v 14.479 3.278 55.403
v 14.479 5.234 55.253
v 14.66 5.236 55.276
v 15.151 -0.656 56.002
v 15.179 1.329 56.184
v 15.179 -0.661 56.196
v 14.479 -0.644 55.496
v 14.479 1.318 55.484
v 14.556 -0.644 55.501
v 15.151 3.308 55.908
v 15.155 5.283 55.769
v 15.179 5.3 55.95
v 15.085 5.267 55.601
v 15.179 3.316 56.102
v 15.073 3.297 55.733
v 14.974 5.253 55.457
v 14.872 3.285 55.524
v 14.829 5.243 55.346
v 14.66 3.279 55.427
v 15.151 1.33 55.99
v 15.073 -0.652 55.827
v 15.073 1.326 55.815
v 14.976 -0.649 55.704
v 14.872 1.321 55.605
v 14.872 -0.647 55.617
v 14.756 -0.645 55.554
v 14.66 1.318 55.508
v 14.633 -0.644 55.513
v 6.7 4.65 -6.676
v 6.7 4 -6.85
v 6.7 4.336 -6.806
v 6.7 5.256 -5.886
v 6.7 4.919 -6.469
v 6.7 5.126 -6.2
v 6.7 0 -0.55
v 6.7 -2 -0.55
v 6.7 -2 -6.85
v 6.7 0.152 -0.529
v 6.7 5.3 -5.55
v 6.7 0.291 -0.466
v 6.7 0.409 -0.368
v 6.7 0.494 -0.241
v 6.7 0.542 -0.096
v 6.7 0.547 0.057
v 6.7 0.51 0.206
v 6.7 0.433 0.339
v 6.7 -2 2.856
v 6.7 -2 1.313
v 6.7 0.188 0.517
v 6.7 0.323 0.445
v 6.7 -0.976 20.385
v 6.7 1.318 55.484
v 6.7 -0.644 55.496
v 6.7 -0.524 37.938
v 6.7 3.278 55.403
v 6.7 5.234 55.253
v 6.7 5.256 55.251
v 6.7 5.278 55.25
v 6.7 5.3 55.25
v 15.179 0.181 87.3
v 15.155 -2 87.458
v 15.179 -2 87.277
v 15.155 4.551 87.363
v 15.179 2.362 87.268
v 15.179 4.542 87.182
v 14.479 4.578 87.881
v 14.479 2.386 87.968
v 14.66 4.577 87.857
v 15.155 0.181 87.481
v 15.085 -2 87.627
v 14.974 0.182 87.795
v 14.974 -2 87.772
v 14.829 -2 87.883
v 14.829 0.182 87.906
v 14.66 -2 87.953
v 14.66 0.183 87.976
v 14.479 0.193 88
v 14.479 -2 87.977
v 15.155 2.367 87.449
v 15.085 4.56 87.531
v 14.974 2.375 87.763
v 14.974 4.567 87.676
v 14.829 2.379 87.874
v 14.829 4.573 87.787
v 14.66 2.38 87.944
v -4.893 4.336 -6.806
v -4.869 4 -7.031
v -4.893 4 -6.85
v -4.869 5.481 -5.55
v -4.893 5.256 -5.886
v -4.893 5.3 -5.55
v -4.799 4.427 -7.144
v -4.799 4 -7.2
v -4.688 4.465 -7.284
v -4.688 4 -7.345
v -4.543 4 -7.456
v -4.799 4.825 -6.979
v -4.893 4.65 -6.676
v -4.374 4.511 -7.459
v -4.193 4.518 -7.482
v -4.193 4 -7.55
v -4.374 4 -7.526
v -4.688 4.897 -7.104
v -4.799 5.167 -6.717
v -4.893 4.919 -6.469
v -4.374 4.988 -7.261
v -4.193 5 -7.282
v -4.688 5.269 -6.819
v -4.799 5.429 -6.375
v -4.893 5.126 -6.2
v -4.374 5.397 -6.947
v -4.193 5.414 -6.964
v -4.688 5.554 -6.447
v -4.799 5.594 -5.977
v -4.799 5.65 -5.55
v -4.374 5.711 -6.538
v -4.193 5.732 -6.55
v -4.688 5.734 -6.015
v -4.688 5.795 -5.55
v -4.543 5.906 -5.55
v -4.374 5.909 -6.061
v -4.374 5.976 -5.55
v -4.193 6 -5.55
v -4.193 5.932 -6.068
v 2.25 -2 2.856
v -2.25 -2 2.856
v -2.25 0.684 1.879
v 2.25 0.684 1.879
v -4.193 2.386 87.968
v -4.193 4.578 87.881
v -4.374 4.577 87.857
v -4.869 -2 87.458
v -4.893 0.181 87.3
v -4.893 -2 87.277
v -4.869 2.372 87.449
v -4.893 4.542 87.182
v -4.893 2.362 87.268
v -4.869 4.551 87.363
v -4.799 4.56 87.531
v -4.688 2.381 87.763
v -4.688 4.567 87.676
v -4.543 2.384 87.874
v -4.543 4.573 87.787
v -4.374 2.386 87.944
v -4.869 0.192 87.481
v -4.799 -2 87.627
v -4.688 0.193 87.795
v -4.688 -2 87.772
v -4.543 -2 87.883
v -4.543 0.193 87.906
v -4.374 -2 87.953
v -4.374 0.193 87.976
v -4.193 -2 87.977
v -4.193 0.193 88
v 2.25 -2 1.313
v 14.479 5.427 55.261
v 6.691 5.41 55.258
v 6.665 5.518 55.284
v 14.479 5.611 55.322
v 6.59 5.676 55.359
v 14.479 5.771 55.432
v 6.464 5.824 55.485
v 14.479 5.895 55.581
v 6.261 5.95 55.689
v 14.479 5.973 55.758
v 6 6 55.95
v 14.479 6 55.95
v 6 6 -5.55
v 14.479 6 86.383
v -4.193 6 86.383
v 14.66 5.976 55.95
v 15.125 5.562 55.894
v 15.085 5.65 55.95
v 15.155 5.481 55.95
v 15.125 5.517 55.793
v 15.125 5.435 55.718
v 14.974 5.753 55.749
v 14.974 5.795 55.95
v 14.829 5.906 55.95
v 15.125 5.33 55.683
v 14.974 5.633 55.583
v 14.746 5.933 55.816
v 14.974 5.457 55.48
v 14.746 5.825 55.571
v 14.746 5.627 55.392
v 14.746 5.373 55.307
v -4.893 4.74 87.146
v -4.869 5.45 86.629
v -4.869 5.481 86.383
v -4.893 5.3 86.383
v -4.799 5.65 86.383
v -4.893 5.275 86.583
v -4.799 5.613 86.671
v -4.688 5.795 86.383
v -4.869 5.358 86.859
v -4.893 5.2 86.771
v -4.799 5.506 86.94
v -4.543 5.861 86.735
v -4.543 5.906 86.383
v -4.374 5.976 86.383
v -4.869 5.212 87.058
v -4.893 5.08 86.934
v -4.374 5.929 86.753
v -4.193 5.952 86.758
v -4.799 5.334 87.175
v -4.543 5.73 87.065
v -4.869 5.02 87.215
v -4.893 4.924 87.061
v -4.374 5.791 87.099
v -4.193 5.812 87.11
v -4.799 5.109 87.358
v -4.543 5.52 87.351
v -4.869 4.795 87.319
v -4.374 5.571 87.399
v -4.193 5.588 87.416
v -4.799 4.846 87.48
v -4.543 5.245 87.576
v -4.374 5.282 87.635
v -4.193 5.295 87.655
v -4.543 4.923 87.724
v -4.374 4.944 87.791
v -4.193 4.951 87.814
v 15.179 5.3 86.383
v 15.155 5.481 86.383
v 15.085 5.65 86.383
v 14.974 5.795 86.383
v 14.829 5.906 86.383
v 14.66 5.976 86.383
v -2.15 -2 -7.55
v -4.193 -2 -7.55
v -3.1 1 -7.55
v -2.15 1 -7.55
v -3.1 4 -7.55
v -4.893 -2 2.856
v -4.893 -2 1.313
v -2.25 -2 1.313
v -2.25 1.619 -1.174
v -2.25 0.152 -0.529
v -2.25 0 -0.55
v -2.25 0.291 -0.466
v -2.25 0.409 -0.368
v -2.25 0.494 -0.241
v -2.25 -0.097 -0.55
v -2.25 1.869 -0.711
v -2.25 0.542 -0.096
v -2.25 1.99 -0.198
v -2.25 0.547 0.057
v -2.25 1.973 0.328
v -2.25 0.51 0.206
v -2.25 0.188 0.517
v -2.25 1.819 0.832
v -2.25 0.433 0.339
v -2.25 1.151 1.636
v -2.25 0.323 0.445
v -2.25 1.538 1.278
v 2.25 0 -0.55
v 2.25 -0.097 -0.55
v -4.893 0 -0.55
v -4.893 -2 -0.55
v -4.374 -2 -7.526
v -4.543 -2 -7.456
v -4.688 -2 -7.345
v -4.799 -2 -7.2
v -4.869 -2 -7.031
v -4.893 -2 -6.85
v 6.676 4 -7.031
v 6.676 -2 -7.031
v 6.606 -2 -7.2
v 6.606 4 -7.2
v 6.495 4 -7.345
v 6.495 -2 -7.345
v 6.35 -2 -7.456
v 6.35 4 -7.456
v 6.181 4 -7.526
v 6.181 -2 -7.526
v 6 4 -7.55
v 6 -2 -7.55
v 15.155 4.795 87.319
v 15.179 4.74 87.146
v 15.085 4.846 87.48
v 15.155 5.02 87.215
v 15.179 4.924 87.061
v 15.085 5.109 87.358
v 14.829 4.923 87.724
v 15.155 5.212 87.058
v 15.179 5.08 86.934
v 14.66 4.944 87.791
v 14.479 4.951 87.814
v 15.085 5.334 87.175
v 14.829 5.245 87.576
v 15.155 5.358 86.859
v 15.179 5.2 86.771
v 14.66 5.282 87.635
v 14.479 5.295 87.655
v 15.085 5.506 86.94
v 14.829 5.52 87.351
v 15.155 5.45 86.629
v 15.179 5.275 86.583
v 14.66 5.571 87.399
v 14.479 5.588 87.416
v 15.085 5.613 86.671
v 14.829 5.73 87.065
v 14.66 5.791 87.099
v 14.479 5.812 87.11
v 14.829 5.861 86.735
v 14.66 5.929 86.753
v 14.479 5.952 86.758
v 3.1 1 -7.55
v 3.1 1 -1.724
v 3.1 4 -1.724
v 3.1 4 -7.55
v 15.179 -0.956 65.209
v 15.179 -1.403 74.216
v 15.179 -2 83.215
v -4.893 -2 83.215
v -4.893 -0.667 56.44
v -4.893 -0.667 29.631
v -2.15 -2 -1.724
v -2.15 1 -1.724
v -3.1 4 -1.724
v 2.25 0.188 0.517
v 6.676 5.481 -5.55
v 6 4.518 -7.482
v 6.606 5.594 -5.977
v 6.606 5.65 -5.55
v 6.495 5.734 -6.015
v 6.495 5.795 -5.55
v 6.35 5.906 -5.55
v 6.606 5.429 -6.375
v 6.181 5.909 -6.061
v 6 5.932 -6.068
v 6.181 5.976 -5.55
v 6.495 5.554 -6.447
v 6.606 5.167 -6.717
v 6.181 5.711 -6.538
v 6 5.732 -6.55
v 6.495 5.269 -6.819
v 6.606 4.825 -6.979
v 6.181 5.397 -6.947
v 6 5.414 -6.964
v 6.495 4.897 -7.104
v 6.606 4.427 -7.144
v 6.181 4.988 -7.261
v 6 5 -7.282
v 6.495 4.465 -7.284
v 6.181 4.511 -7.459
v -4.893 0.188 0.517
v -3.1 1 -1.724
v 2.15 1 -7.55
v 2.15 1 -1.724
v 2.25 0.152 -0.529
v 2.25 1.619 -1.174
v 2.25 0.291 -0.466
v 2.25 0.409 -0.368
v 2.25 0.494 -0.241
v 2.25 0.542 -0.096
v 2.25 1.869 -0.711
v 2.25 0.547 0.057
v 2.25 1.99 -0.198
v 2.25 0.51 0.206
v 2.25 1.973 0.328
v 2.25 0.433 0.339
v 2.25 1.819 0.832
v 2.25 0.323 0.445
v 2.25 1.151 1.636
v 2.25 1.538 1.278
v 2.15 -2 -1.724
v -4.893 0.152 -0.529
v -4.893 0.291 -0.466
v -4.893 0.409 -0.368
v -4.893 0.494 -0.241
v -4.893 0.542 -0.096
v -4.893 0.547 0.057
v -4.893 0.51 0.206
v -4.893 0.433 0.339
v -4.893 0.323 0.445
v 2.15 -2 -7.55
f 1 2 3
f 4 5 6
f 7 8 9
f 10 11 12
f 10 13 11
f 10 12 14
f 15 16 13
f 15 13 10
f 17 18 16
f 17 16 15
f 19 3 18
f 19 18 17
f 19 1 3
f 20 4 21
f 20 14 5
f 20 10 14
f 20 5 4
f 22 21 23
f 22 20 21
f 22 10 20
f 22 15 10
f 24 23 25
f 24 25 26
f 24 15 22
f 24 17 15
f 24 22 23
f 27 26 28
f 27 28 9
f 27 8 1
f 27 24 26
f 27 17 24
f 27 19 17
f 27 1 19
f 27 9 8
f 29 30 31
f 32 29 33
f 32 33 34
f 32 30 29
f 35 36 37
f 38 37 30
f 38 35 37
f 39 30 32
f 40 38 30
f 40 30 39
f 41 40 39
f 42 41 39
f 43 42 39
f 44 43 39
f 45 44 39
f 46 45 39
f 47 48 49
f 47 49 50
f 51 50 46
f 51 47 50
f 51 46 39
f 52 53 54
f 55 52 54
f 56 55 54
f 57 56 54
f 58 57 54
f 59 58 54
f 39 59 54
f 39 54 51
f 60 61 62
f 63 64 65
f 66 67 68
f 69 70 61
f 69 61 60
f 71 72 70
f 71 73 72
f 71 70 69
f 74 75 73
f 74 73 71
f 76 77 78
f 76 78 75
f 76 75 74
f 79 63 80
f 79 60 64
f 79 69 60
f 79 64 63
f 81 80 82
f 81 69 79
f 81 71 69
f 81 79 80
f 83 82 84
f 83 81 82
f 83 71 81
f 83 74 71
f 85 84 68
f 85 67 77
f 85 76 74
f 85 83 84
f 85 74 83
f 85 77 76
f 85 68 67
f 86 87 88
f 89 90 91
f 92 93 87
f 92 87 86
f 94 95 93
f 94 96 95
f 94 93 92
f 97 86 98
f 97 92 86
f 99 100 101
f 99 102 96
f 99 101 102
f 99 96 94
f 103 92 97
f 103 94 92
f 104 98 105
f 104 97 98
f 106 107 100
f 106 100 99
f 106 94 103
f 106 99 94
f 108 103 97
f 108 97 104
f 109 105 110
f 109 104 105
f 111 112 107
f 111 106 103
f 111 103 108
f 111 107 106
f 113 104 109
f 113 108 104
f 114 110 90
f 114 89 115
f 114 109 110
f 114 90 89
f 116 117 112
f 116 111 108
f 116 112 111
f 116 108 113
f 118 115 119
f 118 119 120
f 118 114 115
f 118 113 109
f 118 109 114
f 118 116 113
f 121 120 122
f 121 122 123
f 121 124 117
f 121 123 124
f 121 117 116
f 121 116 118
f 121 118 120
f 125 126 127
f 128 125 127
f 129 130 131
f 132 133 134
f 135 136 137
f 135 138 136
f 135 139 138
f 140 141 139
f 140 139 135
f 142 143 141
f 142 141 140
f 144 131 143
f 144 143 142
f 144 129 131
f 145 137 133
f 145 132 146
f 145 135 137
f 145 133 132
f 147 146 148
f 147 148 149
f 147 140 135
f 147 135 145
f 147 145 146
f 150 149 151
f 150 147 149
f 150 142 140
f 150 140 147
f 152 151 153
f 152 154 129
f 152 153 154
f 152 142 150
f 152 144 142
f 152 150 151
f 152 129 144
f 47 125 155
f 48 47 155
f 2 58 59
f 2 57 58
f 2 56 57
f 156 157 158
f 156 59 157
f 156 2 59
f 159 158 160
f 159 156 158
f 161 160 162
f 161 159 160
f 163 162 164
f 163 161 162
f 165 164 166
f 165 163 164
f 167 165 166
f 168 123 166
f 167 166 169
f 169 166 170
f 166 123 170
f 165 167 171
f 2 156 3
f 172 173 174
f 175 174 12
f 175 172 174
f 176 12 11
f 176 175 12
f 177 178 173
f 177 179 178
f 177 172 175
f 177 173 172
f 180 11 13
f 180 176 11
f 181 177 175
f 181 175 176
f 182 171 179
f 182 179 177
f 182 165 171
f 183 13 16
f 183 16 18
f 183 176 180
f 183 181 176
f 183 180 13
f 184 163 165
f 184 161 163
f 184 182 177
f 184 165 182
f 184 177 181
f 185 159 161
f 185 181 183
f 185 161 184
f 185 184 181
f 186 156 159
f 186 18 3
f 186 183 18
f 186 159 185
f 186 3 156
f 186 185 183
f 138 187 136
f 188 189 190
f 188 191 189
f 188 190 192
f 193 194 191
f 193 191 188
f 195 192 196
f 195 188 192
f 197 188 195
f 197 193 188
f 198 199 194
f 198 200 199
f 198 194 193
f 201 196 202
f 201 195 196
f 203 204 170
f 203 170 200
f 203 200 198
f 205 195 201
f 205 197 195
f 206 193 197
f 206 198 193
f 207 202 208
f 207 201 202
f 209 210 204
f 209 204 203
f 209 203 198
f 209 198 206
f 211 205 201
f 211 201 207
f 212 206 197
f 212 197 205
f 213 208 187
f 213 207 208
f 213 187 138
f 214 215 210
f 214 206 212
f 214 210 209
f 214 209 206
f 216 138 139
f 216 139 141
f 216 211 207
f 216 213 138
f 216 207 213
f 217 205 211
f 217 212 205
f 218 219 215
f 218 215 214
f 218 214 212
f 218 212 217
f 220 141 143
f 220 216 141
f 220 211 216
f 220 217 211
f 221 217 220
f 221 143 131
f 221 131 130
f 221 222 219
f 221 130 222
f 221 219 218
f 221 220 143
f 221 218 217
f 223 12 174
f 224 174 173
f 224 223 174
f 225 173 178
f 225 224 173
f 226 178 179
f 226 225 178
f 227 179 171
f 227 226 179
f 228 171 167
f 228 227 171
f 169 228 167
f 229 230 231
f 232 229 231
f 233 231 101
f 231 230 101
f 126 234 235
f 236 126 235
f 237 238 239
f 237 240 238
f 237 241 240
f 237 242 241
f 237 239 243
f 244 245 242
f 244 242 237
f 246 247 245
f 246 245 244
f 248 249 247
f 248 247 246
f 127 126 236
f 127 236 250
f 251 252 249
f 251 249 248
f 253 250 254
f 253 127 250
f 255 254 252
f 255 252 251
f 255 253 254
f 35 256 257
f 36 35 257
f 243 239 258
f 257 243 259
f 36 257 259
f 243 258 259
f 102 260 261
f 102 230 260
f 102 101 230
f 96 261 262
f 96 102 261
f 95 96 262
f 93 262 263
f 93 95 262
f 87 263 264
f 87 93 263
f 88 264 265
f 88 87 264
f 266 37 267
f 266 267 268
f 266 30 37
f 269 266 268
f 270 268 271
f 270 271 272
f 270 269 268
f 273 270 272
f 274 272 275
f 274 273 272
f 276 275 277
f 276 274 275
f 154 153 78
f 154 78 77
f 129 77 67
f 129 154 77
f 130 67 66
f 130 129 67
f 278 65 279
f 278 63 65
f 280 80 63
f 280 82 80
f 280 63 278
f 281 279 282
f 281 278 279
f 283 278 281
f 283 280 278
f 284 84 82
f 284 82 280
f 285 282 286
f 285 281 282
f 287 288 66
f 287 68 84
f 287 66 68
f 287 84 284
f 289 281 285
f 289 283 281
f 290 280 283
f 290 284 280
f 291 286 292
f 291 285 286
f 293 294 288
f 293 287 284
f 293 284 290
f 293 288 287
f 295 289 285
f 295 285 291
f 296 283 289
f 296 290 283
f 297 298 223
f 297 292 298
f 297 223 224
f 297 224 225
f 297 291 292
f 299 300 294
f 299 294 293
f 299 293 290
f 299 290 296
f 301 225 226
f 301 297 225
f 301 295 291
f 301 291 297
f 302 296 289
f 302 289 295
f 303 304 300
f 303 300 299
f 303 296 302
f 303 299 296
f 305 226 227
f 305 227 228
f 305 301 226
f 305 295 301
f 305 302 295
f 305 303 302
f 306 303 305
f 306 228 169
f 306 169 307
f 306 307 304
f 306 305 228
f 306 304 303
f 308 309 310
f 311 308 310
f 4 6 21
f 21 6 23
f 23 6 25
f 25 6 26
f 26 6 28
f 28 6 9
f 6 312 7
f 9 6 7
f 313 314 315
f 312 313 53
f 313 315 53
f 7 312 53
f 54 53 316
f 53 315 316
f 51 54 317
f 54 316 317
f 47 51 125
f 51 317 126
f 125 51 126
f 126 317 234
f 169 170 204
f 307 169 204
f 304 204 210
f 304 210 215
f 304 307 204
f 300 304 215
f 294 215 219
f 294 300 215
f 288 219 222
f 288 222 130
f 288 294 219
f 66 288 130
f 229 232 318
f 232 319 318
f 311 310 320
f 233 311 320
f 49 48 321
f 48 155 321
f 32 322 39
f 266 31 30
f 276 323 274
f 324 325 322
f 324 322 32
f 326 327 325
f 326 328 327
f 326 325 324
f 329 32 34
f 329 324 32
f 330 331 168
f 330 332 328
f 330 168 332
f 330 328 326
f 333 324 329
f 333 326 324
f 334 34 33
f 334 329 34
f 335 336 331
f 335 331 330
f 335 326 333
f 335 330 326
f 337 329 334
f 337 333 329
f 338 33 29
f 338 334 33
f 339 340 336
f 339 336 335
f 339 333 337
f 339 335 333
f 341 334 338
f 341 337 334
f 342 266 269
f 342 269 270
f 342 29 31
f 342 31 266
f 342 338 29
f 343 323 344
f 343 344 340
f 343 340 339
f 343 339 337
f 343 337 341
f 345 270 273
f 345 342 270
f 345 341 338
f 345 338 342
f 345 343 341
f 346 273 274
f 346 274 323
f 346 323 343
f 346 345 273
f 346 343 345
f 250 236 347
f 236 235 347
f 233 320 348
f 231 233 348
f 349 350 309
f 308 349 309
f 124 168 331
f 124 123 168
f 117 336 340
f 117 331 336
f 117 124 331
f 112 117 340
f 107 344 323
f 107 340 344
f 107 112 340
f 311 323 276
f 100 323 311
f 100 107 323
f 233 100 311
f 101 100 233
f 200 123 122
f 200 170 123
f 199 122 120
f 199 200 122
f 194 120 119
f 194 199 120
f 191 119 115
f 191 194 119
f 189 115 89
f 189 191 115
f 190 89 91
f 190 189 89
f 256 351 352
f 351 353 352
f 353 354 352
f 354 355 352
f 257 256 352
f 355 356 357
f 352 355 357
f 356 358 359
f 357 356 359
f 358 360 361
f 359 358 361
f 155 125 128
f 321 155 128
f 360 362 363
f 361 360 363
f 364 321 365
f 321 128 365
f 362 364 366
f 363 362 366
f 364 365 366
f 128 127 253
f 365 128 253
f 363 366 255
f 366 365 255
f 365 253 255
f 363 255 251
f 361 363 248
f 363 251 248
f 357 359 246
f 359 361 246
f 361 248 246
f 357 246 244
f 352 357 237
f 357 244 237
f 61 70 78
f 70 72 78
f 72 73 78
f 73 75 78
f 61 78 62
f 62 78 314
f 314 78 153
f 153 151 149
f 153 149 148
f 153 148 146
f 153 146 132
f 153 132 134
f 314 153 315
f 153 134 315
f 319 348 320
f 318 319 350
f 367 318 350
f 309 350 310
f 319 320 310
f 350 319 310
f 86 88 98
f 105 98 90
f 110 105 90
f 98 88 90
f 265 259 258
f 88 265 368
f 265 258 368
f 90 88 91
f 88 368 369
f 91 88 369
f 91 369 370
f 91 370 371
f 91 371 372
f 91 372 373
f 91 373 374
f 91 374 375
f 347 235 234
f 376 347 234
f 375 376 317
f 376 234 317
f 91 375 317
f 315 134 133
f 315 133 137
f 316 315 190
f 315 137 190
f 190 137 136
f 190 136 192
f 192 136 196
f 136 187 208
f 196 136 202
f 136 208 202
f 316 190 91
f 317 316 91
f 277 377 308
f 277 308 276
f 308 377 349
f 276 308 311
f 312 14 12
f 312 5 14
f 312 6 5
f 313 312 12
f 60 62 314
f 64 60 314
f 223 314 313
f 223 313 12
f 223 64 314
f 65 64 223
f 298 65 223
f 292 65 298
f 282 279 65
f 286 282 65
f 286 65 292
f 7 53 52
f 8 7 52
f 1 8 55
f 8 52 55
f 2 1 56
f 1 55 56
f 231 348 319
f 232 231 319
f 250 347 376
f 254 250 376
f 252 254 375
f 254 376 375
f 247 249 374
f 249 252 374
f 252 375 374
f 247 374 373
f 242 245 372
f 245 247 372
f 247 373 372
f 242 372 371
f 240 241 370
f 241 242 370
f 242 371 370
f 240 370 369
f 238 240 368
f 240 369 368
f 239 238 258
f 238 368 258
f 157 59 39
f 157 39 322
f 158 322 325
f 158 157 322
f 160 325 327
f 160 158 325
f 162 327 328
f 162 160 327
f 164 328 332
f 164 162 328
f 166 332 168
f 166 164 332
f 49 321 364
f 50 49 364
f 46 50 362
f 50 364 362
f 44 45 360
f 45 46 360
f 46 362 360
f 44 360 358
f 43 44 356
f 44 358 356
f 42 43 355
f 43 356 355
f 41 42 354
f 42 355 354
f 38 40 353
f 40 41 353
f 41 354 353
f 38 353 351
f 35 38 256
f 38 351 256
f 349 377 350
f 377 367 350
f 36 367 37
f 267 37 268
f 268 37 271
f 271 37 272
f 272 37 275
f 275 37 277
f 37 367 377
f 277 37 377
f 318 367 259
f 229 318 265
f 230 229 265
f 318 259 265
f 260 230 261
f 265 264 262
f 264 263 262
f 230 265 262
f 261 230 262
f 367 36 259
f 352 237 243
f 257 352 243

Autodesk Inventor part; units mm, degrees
ref_plane "YZ Plane" through (0, 0, 0) normal (1, 0, 0) x (0, 1, 0)
ref_plane "XZ Plane" through (0, 0, 0) normal (0, 1, 0) x (-1, 0, 0)
ref_plane "Slot Start Plane" through (0, 0, -1.7245) normal (0, 0, 1) x (1, 0, 0)
sketch "Key Profile" plane through (0, 0, 0) normal (1, 0, 0) x (0, 1, 0)
  line L0 (-2, 2.8563) -> (0.684, 1.8794)
  arc A0 (1.6188, -1.1745) -> (0.684, 1.8794) centre (0, 0) ccw
  line L1 (-2, 1.3132) -> (0.1881, 0.5168)
  arc A1 (0, -0.55) -> (0.1881, 0.5168) centre (0, 0) ccw
  line L2 (-2, 2.8563) -> (-2, -0.55)
  line L3 (0, 0) -> (-2, 0) construction
  line L4 (0, -0.55) -> (-2, -0.55)
  line L5 (1.6188, -1.1745) -> (-0.097, -0.55)
  line L6 (6, -5.55) -> (6, 87.7952)
  line L7 (-2, 87.9773) -> (-2, 2.8563)
  arc A2 (6, 87.7952) -> (-2, 87.9773) centre (0, 0) ccw
  line L8 (-2, -0.55) -> (-2, -7.55)
  arc A3 (4, -7.55) -> (6, -5.55) centre (4, -5.55) ccw
  line L9 (-2, -7.55) -> (4, -7.55)
  arc A4 (6, 55.1747) -> (-2, 55.464) centre (0, 0) ccw
  arc A5 (-2, 2.8563) -> (-2, 83.2148) centre (-539.3737, 43.0355) ccw
  point P0 (-0.5, 43.0355)
  point P1 (-0.6441, 55.4963)
  dimension "my_hingeCutRad" = 0.55
  dimension "my_hingeDepth" = 2
  dimension "my_hingeRegCutRad" = 2
  dimension "keyLength" = 88
  dimension "my_KeyHeight" = 8
  dimension "d107" = 20
  dimension "d122" = 4
  dimension "slotOffset" = 1.1745
  dimension "my_backWidth" = 7
  dimension "d128" = 55.5
  dimension "d135" = 1.5
  dimension "d136" = 4.7625
extrude "Upper (u)" add sketch "Key Profile" along normal blind 6.7 and the other way blind 4.8929 contours A5 A4 L6 A3 L9 L8 L4 L5 A0 L0 | L0 A0 L5 L4 A1 L1 L2
extrude "Lower (d)" add sketch "Key Profile" along normal blind 15.1786 and the other way blind 4.8929 contours A5 L7 A2 L6 A4
extrude "Protrusion Cutout" cut sketch "Key Profile" along normal mid plane 4.5 contours L0 A0 L5 L4 A1 L1 L2
fillet "Front Fillet" radius 1.5 1 edges at (5.1429, 6, 87.7952)
sketch "Slot Sketch" plane through (0, 0, -1.7245) normal (0, 0, 1) x (1, 0, 0)
  line L0 (2.15, -2) -> (2.15, 1)
  line L1 (3.1, 4) -> (-3.1, 4)
  line L2 (-2.15, 1) -> (-2.15, -2)
  line L3 (-2.15, -2) -> (2.15, -2)
  line L4 (0, -2) -> (0, 4) construction
  line L5 (-3.1, 4) -> (-3.1, 1)
  line L6 (-3.1, 1) -> (-2.15, 1)
  line L7 (2.15, 1) -> (3.1, 1)
  line L8 (3.1, 1) -> (3.1, 4)
  point P0 (0, 0)
  dimension "d109" = 2
  dimension "my_slotHeadOffset" = 1
  dimension "my_slotHeadHeight" = 3
  dimension "my_slotHeadWidth" = 6.2
  dimension "my_neckSlotWidth" = 4.3
extrude "Slot" cut sketch "Slot Sketch" against normal through all
fillet "Edge Softening" radius 0.7 13 edges at (6.7, 5.4142, -6.9642) (6.7, 1, -7.55) (6.7, 6, 24.8124) (-4.8929, 5.4142, -6.9642) (-4.8929, 1, -7.55) (-4.8929, 6, 40.4164) (-4.8929, 5.5879, 87.4156) (-4.8929, 1.2899, 87.9905) (15.1786, 5.5879, 87.4156) (15.1786, 1.2899, 87.9905) (15.1786, 6, 70.7788) (15.1786, 2.6828, 55.4351) (10.9393, 6, 55.1747)
equation "\"my_headHeight\" = 3"
equation "\"my_headOffset\" = 1"
equation "\"whiteKeyWidth\" = 20.07143"
properties part number "FKey0"
